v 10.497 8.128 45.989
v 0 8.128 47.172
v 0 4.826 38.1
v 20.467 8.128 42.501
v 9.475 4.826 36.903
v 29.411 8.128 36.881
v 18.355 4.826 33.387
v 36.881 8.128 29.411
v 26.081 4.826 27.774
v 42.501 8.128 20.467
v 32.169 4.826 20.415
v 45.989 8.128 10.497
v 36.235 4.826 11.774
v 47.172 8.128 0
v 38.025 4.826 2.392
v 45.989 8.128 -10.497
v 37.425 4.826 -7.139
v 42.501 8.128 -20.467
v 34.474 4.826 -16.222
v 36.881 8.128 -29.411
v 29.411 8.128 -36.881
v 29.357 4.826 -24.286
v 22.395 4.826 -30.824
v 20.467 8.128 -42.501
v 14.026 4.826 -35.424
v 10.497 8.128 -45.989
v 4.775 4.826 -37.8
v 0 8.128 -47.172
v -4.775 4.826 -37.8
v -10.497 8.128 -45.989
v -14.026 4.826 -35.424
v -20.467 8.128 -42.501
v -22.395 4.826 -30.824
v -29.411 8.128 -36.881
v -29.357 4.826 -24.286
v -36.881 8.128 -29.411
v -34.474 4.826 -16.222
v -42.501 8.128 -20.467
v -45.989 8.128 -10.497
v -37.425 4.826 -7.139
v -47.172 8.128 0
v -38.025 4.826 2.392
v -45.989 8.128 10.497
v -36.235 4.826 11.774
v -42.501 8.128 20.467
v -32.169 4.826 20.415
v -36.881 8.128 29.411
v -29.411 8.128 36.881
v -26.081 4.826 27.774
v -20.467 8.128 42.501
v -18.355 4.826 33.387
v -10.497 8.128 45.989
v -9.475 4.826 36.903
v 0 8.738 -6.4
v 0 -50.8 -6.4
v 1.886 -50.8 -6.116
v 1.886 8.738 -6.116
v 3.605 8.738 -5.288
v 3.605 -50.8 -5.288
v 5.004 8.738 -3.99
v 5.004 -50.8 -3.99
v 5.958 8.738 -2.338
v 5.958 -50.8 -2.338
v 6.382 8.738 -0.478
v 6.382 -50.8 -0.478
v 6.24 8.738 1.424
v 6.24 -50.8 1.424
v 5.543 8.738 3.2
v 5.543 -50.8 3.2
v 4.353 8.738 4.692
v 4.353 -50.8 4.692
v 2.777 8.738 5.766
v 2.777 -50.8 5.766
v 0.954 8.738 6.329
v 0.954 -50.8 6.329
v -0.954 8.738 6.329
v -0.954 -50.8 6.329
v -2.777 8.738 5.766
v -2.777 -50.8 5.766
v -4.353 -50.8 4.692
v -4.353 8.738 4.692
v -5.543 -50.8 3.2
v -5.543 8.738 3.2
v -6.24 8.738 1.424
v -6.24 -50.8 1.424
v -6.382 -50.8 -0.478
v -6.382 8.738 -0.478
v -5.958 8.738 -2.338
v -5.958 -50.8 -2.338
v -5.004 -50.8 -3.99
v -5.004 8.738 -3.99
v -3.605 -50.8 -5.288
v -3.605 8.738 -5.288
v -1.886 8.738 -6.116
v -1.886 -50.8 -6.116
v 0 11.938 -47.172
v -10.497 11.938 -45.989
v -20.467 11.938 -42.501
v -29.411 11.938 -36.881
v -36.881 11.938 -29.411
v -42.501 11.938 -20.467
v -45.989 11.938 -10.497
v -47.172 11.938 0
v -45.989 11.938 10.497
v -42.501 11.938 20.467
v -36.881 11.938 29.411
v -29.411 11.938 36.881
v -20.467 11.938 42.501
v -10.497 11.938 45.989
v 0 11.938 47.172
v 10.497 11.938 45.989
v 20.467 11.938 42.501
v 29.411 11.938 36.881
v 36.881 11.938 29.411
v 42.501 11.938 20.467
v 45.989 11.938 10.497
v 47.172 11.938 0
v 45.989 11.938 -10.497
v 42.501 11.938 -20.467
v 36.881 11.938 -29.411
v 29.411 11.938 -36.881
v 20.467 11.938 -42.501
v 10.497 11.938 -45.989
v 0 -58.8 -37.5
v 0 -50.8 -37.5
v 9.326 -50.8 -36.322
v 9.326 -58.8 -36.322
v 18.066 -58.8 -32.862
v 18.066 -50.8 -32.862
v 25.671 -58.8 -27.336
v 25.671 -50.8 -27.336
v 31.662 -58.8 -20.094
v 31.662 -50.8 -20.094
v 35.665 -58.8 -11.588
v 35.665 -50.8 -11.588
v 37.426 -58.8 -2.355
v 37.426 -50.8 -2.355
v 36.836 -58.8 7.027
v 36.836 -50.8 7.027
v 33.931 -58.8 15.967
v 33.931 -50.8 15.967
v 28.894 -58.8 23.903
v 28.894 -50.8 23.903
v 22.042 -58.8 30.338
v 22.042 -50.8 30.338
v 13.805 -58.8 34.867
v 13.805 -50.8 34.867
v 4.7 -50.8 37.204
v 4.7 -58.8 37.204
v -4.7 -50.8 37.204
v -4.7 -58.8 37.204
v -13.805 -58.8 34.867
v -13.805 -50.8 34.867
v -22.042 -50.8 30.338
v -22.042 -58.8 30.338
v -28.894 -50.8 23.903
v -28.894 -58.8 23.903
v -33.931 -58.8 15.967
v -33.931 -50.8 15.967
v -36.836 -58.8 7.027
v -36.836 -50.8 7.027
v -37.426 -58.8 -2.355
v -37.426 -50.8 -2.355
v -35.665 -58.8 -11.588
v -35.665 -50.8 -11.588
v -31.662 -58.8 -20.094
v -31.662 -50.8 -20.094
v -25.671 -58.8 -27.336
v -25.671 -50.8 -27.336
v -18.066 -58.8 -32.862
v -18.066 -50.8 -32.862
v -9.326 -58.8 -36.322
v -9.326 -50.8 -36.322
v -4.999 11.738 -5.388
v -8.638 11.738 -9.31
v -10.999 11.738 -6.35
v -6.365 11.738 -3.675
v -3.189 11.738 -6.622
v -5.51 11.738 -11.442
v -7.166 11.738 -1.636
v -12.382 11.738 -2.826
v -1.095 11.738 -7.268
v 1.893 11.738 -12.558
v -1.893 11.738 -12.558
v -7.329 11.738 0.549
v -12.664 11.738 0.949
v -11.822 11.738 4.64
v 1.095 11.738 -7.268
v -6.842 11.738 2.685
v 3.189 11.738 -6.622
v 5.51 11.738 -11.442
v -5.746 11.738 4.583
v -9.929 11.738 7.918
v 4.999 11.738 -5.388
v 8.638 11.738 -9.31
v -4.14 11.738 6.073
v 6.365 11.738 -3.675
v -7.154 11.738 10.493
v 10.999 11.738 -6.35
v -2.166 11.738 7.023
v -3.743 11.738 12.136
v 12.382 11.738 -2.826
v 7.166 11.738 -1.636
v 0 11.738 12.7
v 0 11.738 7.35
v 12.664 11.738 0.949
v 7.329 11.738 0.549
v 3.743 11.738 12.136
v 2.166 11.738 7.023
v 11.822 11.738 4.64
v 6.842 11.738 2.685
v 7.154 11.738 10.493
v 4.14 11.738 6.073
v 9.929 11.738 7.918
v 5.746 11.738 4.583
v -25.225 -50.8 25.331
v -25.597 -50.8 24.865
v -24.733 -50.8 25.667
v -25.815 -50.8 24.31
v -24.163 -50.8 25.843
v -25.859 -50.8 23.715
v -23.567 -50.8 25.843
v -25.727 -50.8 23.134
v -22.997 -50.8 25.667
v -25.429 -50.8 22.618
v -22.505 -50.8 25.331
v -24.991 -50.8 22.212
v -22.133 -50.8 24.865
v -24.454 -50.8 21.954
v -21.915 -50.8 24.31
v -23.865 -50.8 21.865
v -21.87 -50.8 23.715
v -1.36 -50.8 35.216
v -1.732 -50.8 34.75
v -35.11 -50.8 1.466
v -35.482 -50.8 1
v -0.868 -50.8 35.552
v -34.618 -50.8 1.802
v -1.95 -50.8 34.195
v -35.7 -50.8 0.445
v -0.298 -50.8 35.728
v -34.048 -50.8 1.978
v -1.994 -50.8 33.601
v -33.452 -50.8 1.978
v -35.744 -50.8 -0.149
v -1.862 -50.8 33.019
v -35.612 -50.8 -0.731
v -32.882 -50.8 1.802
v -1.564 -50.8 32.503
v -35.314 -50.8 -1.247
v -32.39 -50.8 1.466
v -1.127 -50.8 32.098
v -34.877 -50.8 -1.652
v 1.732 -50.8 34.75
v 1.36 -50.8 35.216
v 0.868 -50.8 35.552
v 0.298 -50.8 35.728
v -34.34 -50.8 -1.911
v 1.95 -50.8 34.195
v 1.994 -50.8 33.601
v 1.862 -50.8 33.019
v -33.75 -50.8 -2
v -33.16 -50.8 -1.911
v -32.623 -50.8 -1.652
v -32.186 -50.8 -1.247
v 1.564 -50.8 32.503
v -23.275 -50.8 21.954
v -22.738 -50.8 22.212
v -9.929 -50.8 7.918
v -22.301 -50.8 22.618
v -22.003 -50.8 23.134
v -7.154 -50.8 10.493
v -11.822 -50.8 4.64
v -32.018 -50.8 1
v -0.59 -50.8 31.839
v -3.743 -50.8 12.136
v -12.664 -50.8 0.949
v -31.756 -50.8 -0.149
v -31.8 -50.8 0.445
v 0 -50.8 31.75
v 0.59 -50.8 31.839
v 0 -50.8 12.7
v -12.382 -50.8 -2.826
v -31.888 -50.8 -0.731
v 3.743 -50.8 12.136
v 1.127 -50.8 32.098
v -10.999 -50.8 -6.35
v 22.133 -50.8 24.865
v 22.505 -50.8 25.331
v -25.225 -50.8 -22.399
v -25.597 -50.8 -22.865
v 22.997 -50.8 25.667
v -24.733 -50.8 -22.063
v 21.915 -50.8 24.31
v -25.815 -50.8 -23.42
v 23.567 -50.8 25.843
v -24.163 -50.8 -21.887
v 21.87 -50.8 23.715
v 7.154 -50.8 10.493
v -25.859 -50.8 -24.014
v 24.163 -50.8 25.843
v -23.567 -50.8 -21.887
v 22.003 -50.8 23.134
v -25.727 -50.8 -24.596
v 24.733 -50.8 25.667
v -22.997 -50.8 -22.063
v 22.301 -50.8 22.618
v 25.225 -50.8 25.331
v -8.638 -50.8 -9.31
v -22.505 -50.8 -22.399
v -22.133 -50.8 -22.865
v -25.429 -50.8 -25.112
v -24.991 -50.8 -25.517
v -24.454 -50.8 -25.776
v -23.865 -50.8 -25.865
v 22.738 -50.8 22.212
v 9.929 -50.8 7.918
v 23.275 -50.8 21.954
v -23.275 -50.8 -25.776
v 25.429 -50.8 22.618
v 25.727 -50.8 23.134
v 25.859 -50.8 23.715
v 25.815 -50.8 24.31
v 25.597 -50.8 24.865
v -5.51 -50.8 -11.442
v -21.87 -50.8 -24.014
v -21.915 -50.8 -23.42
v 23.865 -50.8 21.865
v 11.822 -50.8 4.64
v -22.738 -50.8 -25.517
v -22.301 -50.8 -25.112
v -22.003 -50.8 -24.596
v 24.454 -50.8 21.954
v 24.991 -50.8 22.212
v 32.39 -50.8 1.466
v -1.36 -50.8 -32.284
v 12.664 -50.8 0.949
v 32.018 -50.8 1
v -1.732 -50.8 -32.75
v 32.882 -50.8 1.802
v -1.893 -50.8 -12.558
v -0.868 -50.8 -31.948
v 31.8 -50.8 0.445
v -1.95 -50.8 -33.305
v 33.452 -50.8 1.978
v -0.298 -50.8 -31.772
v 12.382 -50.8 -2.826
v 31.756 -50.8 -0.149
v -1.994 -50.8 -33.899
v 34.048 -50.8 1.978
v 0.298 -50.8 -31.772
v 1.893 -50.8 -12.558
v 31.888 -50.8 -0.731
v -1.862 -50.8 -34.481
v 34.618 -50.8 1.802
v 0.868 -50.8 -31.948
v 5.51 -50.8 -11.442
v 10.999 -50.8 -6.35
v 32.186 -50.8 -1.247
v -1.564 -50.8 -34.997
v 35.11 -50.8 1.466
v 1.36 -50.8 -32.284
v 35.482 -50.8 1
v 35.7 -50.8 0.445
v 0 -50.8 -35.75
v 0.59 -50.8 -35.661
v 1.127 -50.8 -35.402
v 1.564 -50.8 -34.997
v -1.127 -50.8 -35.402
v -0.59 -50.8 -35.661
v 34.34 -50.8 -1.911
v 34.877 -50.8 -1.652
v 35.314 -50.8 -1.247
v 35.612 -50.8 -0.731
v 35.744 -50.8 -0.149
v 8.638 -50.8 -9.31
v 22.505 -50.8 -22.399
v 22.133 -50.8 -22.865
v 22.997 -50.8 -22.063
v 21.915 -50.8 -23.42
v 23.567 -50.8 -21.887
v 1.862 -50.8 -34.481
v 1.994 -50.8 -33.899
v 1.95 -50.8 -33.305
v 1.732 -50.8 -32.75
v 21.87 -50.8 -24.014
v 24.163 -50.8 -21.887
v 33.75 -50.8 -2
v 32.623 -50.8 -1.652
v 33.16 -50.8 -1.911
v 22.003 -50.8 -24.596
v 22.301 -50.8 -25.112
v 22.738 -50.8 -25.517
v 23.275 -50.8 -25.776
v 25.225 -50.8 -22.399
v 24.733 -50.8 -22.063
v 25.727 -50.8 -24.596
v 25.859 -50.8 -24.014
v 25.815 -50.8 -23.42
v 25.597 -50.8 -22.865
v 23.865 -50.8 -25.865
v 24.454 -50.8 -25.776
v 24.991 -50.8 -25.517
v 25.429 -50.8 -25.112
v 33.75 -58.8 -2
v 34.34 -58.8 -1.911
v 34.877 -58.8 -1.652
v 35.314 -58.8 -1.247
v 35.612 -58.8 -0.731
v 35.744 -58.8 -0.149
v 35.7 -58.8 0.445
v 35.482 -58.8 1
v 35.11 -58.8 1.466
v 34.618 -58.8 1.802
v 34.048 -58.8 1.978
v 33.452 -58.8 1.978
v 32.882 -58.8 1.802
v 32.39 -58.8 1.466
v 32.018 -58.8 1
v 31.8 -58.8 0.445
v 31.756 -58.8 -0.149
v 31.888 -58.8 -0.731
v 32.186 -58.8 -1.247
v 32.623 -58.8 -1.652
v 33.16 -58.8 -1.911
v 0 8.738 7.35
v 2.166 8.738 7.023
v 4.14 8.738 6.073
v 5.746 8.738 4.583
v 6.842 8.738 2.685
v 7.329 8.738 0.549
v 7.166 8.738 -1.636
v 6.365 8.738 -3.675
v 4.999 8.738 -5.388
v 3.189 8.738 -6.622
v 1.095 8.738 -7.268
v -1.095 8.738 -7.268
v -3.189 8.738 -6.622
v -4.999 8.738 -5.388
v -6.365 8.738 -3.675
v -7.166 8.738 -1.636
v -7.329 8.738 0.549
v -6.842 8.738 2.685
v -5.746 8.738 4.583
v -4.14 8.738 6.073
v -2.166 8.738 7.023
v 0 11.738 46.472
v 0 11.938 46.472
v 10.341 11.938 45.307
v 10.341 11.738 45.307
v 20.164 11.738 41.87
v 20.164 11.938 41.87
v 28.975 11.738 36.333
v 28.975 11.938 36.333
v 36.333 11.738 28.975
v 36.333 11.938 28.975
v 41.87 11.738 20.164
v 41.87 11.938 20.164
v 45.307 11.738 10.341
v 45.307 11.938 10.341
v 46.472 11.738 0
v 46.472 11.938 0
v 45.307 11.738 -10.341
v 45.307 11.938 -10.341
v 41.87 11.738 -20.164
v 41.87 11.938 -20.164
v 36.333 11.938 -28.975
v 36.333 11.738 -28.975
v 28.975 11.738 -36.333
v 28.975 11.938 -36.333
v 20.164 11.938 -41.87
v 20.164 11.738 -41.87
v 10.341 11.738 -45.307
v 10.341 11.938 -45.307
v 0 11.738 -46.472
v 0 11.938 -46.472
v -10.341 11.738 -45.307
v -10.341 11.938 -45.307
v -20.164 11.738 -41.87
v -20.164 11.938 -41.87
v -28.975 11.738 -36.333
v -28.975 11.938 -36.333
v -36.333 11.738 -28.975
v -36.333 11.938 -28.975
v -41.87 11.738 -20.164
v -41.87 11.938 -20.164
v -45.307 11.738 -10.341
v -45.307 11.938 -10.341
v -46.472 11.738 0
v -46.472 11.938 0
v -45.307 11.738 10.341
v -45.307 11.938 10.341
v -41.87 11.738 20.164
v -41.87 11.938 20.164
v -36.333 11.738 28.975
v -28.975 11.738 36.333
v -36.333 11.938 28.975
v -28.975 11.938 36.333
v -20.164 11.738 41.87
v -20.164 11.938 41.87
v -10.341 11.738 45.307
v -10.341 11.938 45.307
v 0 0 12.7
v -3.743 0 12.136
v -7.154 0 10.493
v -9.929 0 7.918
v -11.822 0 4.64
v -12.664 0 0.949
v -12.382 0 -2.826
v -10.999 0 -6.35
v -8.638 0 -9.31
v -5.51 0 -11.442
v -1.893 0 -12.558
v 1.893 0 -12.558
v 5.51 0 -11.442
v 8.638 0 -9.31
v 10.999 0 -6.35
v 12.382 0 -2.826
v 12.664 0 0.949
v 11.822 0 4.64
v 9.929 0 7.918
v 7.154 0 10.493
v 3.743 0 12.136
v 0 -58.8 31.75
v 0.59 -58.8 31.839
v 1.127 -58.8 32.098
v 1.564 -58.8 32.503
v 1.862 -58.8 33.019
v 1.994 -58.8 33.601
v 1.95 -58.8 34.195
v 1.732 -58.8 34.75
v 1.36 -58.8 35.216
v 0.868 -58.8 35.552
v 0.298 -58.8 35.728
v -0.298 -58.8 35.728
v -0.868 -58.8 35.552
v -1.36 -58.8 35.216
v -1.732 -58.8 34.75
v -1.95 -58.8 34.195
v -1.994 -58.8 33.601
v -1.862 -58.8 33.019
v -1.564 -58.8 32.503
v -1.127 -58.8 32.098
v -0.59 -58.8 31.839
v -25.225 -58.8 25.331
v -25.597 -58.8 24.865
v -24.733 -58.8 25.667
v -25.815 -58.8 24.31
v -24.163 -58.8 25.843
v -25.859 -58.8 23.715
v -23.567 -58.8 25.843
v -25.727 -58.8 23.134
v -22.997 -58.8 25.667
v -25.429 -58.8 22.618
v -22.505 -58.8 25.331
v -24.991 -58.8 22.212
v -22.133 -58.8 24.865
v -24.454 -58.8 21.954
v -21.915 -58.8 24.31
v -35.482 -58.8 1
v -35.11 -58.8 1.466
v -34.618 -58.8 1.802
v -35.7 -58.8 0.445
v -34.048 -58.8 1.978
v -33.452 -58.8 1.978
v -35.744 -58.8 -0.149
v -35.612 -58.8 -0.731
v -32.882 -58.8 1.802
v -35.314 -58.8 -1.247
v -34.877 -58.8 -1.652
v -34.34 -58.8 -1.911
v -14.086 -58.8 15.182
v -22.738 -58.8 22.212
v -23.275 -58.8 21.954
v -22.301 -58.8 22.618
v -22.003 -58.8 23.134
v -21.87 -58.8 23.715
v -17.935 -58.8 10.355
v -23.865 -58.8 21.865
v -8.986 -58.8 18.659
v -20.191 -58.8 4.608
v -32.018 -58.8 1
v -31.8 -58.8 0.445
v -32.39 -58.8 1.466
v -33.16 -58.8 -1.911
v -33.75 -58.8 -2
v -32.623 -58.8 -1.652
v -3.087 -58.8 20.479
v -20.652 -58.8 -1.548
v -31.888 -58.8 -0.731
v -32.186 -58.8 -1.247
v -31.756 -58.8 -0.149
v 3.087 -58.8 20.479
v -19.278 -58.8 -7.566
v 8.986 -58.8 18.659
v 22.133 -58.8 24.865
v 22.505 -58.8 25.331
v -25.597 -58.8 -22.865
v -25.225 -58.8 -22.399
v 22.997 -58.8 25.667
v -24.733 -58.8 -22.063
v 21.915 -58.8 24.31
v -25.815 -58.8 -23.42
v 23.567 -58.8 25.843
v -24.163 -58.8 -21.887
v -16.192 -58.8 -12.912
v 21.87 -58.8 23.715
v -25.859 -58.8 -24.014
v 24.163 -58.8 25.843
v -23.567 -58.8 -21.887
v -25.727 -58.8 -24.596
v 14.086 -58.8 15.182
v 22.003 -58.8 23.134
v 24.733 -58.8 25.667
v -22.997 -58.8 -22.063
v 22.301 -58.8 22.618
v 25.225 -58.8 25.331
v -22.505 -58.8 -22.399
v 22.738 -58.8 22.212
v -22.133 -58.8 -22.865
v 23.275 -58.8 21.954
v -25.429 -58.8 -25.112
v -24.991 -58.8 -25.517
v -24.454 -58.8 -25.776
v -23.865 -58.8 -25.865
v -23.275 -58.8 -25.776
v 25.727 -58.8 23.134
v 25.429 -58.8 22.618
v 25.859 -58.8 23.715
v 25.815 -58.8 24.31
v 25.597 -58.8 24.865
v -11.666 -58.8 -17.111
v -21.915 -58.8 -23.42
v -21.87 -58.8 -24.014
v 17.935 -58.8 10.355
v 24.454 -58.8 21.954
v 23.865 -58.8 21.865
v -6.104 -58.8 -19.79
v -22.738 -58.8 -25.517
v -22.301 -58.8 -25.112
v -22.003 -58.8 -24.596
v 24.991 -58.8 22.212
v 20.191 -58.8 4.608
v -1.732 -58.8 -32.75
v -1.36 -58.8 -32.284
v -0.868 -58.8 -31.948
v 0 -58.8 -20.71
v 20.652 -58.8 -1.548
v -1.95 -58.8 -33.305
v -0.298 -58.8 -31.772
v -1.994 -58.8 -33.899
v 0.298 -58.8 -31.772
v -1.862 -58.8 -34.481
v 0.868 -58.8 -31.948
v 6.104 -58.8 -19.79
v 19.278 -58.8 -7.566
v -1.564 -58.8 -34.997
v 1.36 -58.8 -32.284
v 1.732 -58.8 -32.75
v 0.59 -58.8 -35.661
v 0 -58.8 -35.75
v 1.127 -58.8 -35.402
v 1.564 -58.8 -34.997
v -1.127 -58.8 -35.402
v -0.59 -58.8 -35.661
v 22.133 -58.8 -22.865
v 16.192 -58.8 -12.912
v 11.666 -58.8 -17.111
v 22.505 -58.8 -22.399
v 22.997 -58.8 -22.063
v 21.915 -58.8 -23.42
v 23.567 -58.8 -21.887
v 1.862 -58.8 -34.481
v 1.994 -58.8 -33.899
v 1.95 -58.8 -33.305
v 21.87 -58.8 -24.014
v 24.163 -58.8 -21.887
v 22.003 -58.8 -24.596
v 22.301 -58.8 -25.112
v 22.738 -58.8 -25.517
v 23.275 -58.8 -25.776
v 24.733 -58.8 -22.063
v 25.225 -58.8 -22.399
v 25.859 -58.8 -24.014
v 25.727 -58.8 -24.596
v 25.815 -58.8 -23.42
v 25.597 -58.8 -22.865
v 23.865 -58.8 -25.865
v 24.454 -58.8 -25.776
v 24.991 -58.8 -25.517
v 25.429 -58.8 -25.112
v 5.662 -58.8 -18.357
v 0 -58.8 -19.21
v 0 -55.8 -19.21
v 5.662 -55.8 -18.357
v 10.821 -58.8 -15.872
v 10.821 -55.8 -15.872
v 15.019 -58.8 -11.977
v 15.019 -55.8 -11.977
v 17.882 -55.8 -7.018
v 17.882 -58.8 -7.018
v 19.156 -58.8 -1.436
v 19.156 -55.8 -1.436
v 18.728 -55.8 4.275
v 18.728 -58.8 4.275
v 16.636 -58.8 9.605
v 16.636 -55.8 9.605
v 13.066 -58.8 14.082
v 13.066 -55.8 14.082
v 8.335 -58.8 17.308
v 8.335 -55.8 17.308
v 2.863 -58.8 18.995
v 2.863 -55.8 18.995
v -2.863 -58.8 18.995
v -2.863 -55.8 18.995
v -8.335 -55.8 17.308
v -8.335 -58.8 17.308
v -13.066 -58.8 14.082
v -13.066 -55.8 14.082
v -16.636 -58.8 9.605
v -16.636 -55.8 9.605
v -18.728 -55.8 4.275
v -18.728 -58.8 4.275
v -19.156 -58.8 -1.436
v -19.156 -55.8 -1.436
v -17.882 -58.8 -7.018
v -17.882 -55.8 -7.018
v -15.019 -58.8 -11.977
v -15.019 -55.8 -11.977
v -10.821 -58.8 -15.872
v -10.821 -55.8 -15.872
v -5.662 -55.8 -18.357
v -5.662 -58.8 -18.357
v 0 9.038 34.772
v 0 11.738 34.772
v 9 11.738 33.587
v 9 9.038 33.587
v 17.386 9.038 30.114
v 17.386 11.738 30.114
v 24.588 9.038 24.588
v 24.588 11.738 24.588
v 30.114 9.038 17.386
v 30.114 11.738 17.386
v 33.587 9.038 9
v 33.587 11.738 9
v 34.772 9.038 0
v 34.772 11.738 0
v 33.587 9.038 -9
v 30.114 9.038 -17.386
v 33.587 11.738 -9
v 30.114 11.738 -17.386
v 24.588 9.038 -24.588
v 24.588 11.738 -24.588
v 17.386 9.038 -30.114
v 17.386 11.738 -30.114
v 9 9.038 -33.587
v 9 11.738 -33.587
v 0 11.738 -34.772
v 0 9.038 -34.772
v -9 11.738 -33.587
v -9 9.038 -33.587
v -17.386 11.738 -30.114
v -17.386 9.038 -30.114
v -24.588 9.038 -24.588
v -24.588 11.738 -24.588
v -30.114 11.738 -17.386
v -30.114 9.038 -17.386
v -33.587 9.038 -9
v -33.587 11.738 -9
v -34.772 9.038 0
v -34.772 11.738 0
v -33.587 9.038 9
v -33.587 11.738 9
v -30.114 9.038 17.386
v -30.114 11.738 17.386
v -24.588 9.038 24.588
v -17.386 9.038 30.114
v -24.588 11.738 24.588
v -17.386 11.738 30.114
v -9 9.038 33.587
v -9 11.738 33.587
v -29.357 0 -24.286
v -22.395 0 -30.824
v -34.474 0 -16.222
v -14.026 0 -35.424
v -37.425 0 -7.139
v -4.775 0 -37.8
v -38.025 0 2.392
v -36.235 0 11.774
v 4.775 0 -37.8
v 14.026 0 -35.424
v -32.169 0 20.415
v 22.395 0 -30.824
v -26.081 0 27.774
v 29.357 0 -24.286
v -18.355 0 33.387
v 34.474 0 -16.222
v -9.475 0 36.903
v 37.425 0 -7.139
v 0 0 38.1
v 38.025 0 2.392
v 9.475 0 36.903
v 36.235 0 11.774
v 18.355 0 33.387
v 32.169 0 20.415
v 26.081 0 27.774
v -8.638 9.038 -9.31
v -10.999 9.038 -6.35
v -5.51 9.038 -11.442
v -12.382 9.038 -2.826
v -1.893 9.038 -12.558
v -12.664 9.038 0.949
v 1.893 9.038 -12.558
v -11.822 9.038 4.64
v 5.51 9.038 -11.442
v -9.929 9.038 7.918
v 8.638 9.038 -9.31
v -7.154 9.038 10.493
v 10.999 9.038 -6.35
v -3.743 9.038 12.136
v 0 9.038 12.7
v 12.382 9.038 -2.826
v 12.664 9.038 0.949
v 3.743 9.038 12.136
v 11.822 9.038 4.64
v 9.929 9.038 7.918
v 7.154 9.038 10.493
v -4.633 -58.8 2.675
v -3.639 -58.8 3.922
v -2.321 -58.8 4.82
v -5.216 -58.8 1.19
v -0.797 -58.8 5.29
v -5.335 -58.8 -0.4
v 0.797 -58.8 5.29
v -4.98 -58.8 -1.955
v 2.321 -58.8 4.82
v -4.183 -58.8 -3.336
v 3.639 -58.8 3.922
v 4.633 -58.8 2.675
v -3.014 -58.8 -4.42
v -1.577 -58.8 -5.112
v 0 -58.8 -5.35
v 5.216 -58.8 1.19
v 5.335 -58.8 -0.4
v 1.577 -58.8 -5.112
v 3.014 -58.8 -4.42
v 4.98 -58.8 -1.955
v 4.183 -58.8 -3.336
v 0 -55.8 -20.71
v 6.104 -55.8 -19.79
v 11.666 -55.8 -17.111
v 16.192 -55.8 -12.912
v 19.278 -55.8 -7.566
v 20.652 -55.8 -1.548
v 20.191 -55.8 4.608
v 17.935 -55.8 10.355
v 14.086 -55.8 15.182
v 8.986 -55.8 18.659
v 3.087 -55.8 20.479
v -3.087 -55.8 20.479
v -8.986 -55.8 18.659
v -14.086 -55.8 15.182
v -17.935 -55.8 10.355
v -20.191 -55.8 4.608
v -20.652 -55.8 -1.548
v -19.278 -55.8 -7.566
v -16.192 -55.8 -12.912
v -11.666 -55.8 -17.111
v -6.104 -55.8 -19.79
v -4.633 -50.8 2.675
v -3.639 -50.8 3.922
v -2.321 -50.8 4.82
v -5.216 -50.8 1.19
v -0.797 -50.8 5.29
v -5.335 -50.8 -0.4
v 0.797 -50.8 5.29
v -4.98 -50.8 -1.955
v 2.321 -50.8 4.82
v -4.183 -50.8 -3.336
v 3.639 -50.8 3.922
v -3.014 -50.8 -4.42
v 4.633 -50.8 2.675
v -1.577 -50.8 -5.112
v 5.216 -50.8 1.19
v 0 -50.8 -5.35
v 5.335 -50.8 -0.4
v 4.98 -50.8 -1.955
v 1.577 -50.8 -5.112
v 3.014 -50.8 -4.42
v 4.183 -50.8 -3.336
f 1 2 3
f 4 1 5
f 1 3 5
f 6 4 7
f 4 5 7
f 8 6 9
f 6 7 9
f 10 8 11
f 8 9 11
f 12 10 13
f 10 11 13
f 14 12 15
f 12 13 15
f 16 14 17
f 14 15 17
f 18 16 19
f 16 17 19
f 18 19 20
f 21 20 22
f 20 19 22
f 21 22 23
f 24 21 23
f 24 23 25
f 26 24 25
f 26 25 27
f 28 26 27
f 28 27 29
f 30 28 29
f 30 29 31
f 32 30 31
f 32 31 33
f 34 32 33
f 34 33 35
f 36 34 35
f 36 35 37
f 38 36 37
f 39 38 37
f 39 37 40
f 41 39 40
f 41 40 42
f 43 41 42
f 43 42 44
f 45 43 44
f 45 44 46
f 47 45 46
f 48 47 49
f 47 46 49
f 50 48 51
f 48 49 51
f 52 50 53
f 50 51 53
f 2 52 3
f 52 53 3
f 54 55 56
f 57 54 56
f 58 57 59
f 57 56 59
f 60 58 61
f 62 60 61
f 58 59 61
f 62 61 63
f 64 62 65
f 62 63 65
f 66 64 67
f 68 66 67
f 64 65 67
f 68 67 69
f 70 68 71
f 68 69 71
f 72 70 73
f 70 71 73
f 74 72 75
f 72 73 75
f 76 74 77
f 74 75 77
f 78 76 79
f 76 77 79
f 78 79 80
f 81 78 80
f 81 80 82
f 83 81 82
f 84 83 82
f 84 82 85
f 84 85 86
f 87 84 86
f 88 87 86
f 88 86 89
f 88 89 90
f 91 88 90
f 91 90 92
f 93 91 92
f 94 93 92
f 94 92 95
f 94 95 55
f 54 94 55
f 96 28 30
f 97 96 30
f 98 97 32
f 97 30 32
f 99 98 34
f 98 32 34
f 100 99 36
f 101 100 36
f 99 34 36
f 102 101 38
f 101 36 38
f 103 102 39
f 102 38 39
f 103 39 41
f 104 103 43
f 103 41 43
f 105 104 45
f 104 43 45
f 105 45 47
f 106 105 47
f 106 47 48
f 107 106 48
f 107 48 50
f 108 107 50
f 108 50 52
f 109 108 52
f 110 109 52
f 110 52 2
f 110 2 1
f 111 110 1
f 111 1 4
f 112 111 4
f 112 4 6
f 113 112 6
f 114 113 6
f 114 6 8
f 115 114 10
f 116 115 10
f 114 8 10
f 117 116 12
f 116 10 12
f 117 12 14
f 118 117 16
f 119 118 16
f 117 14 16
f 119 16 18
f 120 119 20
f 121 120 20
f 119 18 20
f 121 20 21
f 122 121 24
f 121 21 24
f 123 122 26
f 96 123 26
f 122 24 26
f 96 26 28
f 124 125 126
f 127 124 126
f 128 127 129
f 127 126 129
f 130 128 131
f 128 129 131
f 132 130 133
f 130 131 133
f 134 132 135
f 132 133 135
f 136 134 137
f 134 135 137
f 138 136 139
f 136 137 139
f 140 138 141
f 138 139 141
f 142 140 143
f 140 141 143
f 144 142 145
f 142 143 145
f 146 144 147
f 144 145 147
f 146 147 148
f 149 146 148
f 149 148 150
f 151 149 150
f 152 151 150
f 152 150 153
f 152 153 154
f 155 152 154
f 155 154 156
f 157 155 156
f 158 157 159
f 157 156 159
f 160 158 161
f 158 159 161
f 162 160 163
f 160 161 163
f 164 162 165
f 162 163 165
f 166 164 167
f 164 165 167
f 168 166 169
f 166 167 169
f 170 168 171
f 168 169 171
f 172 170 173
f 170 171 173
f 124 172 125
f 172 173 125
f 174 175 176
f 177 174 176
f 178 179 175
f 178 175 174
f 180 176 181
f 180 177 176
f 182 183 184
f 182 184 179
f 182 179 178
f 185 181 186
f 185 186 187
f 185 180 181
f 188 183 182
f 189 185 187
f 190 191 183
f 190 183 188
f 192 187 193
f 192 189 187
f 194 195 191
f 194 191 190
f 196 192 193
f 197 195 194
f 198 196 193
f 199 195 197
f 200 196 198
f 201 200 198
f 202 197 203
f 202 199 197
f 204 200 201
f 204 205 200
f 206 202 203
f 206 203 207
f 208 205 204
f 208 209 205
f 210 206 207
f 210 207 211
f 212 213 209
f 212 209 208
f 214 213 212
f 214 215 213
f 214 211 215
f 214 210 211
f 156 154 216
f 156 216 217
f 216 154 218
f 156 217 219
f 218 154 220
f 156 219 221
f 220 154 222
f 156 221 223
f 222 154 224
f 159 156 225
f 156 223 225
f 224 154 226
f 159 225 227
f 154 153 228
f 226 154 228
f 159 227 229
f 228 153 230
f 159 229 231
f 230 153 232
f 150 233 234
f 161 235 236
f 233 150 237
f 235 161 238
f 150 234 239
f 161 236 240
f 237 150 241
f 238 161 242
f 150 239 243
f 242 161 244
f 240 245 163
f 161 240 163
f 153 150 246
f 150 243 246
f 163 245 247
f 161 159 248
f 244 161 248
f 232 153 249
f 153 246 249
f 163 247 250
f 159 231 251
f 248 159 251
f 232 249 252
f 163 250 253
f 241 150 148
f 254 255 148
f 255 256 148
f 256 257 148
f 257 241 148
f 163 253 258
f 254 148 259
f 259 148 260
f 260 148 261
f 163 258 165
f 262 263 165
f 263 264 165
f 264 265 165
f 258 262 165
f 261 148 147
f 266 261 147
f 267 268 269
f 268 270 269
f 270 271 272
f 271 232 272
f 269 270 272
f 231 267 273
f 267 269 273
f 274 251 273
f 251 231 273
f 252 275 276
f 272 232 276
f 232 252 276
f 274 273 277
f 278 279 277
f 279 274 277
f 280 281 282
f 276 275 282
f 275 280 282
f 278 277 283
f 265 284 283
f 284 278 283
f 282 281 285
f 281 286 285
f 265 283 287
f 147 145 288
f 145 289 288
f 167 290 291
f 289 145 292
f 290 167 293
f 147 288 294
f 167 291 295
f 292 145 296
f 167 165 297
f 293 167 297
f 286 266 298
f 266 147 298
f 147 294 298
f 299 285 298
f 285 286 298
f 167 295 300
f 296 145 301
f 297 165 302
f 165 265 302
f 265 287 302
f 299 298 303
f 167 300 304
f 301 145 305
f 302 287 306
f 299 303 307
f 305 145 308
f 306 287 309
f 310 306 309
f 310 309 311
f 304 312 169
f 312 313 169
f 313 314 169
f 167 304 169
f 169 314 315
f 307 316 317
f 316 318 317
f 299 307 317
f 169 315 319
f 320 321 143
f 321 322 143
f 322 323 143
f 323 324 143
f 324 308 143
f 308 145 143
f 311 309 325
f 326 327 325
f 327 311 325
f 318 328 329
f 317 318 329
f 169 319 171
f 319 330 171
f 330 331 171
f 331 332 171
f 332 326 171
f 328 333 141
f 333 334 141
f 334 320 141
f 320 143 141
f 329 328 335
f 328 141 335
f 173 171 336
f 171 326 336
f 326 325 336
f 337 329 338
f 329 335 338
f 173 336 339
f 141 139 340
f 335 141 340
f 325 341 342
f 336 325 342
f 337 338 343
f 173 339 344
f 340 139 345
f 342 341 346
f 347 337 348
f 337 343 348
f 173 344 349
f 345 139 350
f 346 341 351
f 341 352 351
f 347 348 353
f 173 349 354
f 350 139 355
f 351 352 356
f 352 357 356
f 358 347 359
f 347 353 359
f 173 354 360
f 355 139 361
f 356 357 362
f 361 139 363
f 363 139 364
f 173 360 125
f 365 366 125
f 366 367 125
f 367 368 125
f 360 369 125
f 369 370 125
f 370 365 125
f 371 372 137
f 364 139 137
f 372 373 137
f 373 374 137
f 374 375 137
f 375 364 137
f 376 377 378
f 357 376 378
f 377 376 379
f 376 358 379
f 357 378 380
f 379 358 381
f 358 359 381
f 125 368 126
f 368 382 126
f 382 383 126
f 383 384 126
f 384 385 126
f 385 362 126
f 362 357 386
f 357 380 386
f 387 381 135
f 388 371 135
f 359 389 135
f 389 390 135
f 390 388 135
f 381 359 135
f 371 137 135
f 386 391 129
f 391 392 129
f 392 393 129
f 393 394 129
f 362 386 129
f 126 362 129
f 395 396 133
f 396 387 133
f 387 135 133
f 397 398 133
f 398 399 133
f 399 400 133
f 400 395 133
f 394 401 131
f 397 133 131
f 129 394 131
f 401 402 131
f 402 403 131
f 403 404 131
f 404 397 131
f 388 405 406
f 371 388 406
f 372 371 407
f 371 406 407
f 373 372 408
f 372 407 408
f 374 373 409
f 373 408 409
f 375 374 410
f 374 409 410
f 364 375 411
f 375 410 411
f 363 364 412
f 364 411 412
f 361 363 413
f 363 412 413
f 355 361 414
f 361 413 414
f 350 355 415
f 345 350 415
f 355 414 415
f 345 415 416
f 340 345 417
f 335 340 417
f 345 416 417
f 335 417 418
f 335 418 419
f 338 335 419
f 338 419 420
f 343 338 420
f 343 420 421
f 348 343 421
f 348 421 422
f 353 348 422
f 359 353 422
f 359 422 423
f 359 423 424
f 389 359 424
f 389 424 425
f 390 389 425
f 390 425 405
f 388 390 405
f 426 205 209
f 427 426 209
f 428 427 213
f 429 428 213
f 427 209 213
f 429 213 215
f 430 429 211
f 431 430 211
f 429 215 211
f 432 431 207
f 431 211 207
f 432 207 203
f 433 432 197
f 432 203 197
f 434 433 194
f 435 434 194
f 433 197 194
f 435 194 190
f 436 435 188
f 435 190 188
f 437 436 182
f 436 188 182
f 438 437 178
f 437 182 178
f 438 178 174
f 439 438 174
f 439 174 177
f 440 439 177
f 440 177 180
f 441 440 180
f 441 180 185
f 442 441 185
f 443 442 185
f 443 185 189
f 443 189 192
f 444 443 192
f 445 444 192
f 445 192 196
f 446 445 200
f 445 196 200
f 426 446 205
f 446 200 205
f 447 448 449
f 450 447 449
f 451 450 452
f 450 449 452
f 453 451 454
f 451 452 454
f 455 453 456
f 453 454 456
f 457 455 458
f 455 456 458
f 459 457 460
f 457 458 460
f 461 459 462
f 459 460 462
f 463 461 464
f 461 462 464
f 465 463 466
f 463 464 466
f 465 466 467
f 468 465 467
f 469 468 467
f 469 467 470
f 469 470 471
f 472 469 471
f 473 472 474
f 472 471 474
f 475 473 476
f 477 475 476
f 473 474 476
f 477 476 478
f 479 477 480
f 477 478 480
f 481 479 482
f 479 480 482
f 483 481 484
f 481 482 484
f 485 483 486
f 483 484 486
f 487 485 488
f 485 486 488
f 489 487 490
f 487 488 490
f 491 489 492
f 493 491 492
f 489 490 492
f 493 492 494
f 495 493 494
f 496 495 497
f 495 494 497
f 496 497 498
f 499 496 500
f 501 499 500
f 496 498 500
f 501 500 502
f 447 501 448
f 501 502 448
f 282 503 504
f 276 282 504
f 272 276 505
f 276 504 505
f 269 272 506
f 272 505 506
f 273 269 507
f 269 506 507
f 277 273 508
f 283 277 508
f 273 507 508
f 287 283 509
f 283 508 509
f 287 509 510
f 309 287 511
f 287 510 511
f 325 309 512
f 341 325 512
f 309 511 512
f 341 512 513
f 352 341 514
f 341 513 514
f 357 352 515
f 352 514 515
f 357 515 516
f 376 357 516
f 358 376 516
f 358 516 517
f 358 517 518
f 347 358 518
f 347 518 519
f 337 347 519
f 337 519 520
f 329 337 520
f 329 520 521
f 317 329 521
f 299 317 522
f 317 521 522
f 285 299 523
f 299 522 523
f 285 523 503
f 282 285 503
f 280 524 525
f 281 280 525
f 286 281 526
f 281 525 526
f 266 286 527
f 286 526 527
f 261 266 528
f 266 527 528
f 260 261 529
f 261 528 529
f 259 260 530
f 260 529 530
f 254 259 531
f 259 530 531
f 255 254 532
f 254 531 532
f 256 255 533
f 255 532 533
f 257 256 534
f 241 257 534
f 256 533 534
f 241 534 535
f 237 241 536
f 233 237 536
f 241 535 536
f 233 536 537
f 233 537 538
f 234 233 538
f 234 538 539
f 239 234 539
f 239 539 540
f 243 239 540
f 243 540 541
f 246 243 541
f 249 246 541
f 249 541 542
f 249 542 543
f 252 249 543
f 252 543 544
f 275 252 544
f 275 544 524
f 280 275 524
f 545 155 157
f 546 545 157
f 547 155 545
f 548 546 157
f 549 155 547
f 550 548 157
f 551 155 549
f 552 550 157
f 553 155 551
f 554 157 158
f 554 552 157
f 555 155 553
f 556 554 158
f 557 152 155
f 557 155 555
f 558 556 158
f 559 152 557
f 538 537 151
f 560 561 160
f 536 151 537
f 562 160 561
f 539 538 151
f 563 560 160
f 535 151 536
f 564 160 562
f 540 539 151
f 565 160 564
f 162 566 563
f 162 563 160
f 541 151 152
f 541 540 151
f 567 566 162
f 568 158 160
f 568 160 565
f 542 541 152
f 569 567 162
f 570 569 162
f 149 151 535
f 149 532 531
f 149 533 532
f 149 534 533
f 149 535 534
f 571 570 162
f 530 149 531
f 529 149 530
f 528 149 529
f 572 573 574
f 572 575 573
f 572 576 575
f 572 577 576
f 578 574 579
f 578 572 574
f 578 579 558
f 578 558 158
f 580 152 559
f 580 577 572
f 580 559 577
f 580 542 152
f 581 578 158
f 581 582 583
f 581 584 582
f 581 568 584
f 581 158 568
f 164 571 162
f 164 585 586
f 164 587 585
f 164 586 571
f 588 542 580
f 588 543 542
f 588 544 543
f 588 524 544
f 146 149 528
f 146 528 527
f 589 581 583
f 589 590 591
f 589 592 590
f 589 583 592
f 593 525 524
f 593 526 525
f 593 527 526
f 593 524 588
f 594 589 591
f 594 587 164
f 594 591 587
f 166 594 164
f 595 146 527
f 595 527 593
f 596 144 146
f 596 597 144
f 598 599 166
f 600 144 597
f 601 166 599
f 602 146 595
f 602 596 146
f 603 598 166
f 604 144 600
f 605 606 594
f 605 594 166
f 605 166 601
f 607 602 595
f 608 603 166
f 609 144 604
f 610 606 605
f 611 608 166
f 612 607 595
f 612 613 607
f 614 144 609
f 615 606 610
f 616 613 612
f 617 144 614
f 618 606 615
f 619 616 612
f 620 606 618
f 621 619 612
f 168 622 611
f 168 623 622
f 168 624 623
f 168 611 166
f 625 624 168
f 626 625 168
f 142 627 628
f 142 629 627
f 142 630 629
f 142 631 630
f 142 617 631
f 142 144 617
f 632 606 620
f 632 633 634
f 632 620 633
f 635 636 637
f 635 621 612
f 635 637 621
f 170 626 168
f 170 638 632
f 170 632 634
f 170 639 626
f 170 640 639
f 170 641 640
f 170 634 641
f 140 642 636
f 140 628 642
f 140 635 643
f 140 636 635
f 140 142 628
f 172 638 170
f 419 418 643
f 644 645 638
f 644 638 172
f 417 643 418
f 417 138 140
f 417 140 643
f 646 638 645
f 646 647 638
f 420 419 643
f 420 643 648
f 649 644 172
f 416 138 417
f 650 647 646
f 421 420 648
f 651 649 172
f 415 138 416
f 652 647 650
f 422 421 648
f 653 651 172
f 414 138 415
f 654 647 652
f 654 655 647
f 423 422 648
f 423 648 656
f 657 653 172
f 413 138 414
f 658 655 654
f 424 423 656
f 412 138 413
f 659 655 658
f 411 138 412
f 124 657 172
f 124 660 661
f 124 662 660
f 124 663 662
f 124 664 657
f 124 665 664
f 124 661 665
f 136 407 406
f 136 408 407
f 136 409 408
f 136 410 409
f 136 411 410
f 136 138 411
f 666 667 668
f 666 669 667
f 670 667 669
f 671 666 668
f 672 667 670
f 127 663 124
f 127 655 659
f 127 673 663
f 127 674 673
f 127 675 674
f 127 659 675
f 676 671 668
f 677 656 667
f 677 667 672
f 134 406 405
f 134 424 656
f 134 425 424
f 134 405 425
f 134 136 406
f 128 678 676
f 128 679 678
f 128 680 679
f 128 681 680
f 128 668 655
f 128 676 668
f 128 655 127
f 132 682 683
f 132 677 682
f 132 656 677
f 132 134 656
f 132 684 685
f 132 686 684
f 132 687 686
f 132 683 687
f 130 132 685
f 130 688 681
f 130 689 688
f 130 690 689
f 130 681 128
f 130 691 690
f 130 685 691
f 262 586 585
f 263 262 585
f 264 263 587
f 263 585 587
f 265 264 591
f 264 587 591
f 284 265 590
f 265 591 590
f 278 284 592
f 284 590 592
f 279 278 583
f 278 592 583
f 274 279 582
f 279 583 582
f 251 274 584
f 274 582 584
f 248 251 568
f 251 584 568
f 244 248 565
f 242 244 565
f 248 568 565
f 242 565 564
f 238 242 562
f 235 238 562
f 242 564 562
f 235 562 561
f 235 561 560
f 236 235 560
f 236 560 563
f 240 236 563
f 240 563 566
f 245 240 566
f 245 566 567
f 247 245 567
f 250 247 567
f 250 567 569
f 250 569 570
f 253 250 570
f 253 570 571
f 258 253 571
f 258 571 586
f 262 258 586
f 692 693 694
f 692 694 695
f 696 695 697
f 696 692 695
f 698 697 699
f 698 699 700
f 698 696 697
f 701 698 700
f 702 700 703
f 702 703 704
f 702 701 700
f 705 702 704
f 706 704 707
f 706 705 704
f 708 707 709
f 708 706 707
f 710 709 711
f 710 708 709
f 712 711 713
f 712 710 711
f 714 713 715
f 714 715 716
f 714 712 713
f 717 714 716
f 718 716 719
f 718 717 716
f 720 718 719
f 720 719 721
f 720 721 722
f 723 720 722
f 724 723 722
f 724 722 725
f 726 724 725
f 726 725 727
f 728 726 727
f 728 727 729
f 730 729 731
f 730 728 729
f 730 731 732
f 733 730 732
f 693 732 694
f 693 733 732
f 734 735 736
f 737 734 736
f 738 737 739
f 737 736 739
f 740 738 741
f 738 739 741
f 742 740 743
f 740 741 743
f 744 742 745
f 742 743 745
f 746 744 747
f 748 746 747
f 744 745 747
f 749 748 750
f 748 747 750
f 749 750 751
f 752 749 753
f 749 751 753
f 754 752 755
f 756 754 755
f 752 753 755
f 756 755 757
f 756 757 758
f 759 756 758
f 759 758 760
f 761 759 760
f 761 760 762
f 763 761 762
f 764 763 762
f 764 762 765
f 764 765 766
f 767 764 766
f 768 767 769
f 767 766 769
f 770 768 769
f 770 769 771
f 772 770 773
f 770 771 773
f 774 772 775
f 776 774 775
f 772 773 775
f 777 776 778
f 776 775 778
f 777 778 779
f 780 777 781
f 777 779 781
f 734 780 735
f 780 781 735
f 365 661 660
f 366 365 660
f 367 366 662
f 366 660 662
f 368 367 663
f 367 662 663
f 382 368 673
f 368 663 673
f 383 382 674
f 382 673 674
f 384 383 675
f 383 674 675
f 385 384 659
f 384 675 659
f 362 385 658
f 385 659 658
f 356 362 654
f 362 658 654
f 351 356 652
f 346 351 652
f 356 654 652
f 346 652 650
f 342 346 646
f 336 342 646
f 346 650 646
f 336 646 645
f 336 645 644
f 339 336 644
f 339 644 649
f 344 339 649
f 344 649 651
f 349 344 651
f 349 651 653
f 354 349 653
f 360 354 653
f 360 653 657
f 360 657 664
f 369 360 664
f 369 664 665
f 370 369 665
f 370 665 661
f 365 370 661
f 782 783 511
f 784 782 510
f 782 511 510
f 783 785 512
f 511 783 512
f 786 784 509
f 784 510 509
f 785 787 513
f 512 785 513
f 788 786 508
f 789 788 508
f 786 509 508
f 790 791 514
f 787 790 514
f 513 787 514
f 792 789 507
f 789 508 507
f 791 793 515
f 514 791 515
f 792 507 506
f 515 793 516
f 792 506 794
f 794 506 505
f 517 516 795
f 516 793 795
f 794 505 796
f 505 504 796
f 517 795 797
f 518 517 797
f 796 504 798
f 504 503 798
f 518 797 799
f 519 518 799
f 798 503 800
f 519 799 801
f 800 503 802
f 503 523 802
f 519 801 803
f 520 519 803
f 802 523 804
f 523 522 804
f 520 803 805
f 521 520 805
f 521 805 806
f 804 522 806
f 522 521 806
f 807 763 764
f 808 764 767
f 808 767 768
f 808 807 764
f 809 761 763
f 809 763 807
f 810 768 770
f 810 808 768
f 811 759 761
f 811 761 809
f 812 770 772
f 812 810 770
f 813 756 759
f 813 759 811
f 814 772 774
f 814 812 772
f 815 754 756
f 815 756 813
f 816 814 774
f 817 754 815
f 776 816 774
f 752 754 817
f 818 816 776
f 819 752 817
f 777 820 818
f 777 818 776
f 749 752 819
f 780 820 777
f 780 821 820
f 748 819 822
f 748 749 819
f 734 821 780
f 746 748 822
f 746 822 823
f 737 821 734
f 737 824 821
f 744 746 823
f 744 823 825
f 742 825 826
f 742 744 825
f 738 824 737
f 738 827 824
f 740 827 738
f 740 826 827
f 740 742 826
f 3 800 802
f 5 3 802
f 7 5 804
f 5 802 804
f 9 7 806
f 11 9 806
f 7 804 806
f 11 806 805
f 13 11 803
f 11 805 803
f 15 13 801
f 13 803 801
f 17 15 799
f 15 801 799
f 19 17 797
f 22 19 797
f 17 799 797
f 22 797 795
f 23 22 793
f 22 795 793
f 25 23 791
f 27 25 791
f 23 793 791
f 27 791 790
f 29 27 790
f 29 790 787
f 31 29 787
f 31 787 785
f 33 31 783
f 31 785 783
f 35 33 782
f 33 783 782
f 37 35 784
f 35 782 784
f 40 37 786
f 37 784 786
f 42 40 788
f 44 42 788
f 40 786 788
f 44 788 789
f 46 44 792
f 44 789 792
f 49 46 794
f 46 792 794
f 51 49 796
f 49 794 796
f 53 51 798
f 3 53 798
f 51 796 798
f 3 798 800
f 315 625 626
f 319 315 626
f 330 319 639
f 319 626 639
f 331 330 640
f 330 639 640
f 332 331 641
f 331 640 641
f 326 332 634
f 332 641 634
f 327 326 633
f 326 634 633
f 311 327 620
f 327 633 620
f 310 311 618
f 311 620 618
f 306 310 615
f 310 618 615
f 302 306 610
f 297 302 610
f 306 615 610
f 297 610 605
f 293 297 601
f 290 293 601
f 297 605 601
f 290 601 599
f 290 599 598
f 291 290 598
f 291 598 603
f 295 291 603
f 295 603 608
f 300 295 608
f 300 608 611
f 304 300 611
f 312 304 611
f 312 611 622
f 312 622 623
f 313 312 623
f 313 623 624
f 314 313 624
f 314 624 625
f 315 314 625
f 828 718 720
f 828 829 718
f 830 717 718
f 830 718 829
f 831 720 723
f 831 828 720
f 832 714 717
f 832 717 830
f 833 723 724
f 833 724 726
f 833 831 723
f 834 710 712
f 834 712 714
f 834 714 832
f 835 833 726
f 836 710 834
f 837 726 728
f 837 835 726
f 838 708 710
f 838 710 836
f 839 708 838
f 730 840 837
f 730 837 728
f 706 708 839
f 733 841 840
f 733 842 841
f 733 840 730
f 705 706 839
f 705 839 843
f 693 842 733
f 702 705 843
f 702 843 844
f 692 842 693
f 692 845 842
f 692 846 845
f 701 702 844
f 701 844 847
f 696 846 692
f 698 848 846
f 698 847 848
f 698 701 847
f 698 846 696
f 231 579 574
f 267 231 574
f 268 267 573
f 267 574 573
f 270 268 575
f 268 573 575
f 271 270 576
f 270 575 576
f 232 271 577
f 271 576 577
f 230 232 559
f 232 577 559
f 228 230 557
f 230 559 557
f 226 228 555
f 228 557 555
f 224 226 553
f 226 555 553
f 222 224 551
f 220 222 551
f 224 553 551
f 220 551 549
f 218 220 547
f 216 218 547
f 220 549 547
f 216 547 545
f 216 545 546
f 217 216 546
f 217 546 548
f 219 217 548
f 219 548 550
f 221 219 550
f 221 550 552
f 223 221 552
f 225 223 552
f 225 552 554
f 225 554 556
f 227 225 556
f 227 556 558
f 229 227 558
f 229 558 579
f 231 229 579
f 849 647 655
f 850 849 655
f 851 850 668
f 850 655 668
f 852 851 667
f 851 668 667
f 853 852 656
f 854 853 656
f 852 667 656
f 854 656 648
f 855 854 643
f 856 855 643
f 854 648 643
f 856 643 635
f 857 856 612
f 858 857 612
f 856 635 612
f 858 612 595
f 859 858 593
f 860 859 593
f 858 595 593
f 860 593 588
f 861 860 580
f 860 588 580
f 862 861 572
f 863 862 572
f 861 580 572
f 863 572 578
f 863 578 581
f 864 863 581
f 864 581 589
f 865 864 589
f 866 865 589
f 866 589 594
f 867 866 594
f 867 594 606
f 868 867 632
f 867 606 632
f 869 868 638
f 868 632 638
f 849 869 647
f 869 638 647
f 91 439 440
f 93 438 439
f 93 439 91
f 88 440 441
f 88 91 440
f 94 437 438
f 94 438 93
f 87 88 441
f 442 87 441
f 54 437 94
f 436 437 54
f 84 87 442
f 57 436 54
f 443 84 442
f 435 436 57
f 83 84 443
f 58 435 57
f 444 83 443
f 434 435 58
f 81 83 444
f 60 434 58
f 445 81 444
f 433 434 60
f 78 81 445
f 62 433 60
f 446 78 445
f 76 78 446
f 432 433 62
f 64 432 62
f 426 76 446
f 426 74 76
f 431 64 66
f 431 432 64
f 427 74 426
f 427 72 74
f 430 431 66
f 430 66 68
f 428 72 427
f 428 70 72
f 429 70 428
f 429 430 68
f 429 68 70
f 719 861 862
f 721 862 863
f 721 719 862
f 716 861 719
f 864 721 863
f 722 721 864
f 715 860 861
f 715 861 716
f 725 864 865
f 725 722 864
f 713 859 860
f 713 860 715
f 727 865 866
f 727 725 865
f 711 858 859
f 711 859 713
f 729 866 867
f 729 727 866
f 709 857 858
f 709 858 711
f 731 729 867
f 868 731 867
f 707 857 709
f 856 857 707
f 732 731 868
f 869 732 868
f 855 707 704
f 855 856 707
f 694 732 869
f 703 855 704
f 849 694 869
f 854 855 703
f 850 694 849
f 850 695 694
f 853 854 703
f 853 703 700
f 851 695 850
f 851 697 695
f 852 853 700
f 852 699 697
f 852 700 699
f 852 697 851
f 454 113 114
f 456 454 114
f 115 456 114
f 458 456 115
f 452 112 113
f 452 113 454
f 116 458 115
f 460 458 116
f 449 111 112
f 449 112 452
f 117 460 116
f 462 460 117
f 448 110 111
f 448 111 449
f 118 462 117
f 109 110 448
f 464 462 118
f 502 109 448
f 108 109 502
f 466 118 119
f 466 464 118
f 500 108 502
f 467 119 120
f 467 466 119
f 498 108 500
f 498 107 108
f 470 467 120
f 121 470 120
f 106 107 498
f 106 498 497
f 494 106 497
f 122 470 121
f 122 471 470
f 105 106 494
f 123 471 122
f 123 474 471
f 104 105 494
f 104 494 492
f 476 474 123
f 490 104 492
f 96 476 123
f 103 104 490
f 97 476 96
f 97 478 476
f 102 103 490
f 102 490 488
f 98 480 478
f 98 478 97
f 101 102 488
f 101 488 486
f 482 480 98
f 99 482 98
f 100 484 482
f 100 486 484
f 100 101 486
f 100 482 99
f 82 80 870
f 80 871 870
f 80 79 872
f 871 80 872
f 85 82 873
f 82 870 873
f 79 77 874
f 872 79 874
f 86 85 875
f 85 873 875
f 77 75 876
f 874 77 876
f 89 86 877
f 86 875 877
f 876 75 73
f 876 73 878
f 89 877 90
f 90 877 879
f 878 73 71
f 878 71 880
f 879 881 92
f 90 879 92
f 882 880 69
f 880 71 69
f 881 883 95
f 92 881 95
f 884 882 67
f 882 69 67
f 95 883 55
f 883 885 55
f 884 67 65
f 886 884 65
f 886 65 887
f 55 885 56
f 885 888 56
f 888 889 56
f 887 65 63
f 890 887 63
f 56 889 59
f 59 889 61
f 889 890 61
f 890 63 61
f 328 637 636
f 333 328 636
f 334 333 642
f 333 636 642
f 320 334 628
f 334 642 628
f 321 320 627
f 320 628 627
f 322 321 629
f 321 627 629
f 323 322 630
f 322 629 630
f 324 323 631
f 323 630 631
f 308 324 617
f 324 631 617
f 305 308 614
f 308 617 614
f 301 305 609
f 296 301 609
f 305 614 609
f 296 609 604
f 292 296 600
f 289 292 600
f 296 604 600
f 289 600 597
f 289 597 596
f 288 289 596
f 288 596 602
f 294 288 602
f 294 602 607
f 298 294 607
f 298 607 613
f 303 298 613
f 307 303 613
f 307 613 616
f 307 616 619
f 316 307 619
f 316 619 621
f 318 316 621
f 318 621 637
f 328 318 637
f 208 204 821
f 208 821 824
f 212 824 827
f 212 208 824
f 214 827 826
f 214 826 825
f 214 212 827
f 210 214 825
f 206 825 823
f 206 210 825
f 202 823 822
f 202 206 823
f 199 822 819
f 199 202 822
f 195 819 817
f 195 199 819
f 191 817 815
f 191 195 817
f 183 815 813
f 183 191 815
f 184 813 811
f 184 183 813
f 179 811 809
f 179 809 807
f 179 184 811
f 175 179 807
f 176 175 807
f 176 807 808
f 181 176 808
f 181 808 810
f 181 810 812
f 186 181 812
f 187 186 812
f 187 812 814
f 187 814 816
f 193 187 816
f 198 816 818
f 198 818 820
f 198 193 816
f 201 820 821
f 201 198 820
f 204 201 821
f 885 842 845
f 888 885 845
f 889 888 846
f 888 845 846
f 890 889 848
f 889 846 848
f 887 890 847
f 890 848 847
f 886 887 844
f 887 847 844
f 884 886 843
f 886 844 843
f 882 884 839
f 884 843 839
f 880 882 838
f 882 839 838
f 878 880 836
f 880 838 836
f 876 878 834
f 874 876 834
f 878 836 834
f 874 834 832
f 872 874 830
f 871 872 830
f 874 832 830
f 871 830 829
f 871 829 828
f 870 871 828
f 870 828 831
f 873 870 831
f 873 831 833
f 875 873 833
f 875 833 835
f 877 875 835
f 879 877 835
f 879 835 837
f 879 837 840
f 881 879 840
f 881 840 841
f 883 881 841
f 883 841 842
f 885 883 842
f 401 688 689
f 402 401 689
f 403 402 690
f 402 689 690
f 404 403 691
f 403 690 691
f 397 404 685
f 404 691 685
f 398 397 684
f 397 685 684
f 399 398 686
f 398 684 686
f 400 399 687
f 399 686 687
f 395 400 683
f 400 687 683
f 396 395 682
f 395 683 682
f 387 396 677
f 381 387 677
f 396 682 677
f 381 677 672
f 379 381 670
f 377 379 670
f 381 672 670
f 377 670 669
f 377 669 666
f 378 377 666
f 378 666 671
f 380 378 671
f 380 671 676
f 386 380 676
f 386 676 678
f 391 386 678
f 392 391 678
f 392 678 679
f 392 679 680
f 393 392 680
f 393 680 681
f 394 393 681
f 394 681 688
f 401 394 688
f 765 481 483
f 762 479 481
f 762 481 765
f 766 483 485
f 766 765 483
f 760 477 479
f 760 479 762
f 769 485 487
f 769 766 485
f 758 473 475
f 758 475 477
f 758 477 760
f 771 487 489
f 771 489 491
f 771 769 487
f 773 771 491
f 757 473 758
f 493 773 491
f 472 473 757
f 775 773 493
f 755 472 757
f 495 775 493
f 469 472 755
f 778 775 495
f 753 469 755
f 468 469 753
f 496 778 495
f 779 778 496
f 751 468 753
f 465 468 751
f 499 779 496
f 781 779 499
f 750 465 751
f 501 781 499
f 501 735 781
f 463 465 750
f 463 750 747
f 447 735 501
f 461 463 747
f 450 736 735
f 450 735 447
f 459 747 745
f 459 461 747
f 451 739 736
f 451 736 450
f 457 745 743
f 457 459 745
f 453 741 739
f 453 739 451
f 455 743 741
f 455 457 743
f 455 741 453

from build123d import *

# Parameters (mm, degrees)
SKETCH1_R           = 38.1
BOSS_EXTRUDE1_DEPTH = 4.826
SKETCH2_R           = 38.1
BOSS_EXTRUDE2_DEPTH = 3.302
BOSS_EXTRUDE2_DRAFT = -70
SKETCH3_R           = 47.172170439
BOSS_EXTRUDE3_DEPTH = 3.81
SKETCH4_R           = 46.472170439
CUT_EXTRUDE1_DEPTH  = 0.2
SKETCH6_R           = 34.772170439
SKETCH6_R_2         = 12.7
CUT_EXTRUDE2_DEPTH  = 2.7
SKETCH8_R           = 12.7
BOSS_EXTRUDE4_DEPTH = 50.8
SKETCH10_R          = 7.35
CUT_EXTRUDE5_DEPTH  = 3
SKETCH13_R          = 6.4
CUT_EXTRUDE9_DEPTH  = 92.577748235
SKETCH15_R          = 37.5
BOSS_EXTRUDE6_DEPTH = 8
CUT_EXTRUDE10_REACH = 99.233
SKETCH16_R          = 2
SKETCH16_R_2        = 5.35
SKETCH17_R          = 20.71
SKETCH17_R_2        = 19.21
CUT_EXTRUDE11_DEPTH = 3


with BuildPart() as part:
    # Sketch1 → Boss-Extrude1 (new body)
    with BuildSketch(Plane(origin=(0, 0, 0), x_dir=(1, 0, 0), z_dir=(0, 1, 0))):
        with Locations(Location((0, 0, 0), (0, 0, 270))):
            Circle(SKETCH1_R)
    extrude(amount=BOSS_EXTRUDE1_DEPTH)


with BuildPart() as boss_extrude2_tool:
    # Sketch2 → Boss-Extrude2 (with draft: the straight prism first)
    with BuildSketch(Plane(origin=(0, 4.826, 0), x_dir=(1, 0, 0), z_dir=(0, 1, 0))):
        with Locations(Location((0, 0, 0), (0, 0, 270))):
            Circle(SKETCH2_R)
    extrude(amount=BOSS_EXTRUDE2_DEPTH)
    # Boss-Extrude2: the draft: its side faces are tilted about the plane it starts from
    boss_extrude2_sides = [boss_extrude2_tool.faces().sort_by_distance(p)[0] for p in [
        (0, 6.477, -38.1),
    ]]
    draft(boss_extrude2_sides, Plane(origin=(0, 4.826, 0), x_dir=(1, 0, 0), z_dir=(0, 1, 0)), BOSS_EXTRUDE2_DRAFT)


with BuildPart() as part_1:
    add(part.part)

    # Boss-Extrude2: add boss_extrude2_tool
    add(boss_extrude2_tool.part)

    # Sketch3 → Boss-Extrude3 (add)
    with BuildSketch(Plane(origin=(0, 8.128, 0), x_dir=(1, 0, 0), z_dir=(0, 1, 0))):
        with Locations(Location((0, 0, 0), (0, 0, 90))):
            Circle(SKETCH3_R)
    extrude(amount=BOSS_EXTRUDE3_DEPTH)

    # Sketch4 → Cut-Extrude1 (cut)
    with BuildSketch(Plane(origin=(0, 11.938, 0), x_dir=(1, 0, 0), z_dir=(0, 1, 0))):
        with Locations(Location((0, 0, 0), (0, 0, 270))):
            Circle(SKETCH4_R)
    extrude(amount=-CUT_EXTRUDE1_DEPTH, mode=Mode.SUBTRACT)

    # Sketch6 → Cut-Extrude2 (cut)
    with BuildSketch(Plane(origin=(0, 11.738, 0), x_dir=(1, 0, 0), z_dir=(0, 1, 0))):
        with Locations(Location((0, 0, 0), (0, 0, 270))):
            Circle(SKETCH6_R)
        with Locations(Location((0, 0, 0), (0, 0, 270))):
            Circle(SKETCH6_R_2, mode=Mode.SUBTRACT)
    extrude(amount=-CUT_EXTRUDE2_DEPTH, mode=Mode.SUBTRACT)

    # Sketch8 → Boss-Extrude4 (add)
    with BuildSketch(Plane.XZ):
        with Locations(Location((0, 0, 0), (0, 0, 90))):
            Circle(SKETCH8_R)
    extrude(amount=BOSS_EXTRUDE4_DEPTH)

    # Sketch10 → Cut-Extrude5 (cut)
    with BuildSketch(Plane(origin=(0, 11.738, 0), x_dir=(1, 0, 0), z_dir=(0, 1, 0))):
        with Locations(Location((0, 0, 0), (0, 0, 270))):
            Circle(SKETCH10_R)
    extrude(amount=-CUT_EXTRUDE5_DEPTH, mode=Mode.SUBTRACT)

    # Sketch13 → Cut-Extrude9 (cut, through all)
    with BuildSketch(Plane(origin=(0, -50.8, 0), x_dir=(-1, 0, 0), z_dir=(0, -1, 0))):
        with Locations(Location((0, 0, 0), (0, 0, 90))):
            Circle(SKETCH13_R)
    extrude(amount=-CUT_EXTRUDE9_DEPTH, mode=Mode.SUBTRACT)

    # Sketch15 → Boss-Extrude6 (add)
    with BuildSketch(Plane.XZ.offset(50.8)):
        with Locations(Location((0, 0, 0), (0, 0, 270))):
            Circle(SKETCH15_R)
    extrude(amount=BOSS_EXTRUDE6_DEPTH)

    # Sketch16 → Cut-Extrude10 (cut, up to next)
    with BuildSketch(Plane.XZ.offset(58.8), mode=Mode.PRIVATE) as cut_extrude10_sk1:
        with Locations(Location((0, 33.75, 0), (0, 0, 270))):
            Circle(SKETCH16_R)
    cut_extrude10_tool1 = extrude(cut_extrude10_sk1.sketch, amount=-CUT_EXTRUDE10_REACH, mode=Mode.PRIVATE) & part_1.part
    # Sketch16 → Cut-Extrude10 (cut, up to next)
    with BuildSketch(Plane.XZ.offset(58.8), mode=Mode.PRIVATE) as cut_extrude10_sk2:
        with Locations(Location((23.864853865, 23.864853865, 0), (0, 0, 270))):
            Circle(SKETCH16_R)
    cut_extrude10_tool2 = extrude(cut_extrude10_sk2.sketch, amount=-CUT_EXTRUDE10_REACH, mode=Mode.PRIVATE) & part_1.part
    # Sketch16 → Cut-Extrude10 (cut, up to next)
    with BuildSketch(Plane.XZ.offset(58.8), mode=Mode.PRIVATE) as cut_extrude10_sk3:
        with Locations(Location((33.75, 0, 0), (0, 0, 270))):
            Circle(SKETCH16_R)
    cut_extrude10_tool3 = extrude(cut_extrude10_sk3.sketch, amount=-CUT_EXTRUDE10_REACH, mode=Mode.PRIVATE) & part_1.part
    # Sketch16 → Cut-Extrude10 (cut, up to next)
    with BuildSketch(Plane.XZ.offset(58.8), mode=Mode.PRIVATE) as cut_extrude10_sk4:
        with Locations(Location((23.864853865, -23.864853865, 0), (0, 0, 270))):
            Circle(SKETCH16_R)
    cut_extrude10_tool4 = extrude(cut_extrude10_sk4.sketch, amount=-CUT_EXTRUDE10_REACH, mode=Mode.PRIVATE) & part_1.part
    # Sketch16 → Cut-Extrude10 (cut, up to next)
    with BuildSketch(Plane.XZ.offset(58.8), mode=Mode.PRIVATE) as cut_extrude10_sk5:
        with Locations(Location((0, -33.75, 0), (0, 0, 270))):
            Circle(SKETCH16_R)
    cut_extrude10_tool5 = extrude(cut_extrude10_sk5.sketch, amount=-CUT_EXTRUDE10_REACH, mode=Mode.PRIVATE) & part_1.part
    # Sketch16 → Cut-Extrude10 (cut, up to next)
    with BuildSketch(Plane.XZ.offset(58.8), mode=Mode.PRIVATE) as cut_extrude10_sk6:
        with Locations(Location((-23.864853865, -23.864853865, 0), (0, 0, 270))):
            Circle(SKETCH16_R)
    cut_extrude10_tool6 = extrude(cut_extrude10_sk6.sketch, amount=-CUT_EXTRUDE10_REACH, mode=Mode.PRIVATE) & part_1.part
    # Sketch16 → Cut-Extrude10 (cut, up to next)
    with BuildSketch(Plane.XZ.offset(58.8), mode=Mode.PRIVATE) as cut_extrude10_sk7:
        with Locations(Location((-33.75, 0, 0), (0, 0, 270))):
            Circle(SKETCH16_R)
    cut_extrude10_tool7 = extrude(cut_extrude10_sk7.sketch, amount=-CUT_EXTRUDE10_REACH, mode=Mode.PRIVATE) & part_1.part
    # Sketch16 → Cut-Extrude10 (cut, up to next)
    with BuildSketch(Plane.XZ.offset(58.8), mode=Mode.PRIVATE) as cut_extrude10_sk8:
        with Locations(Location((-23.864853865, 23.864853865, 0), (0, 0, 270))):
            Circle(SKETCH16_R)
    cut_extrude10_tool8 = extrude(cut_extrude10_sk8.sketch, amount=-CUT_EXTRUDE10_REACH, mode=Mode.PRIVATE) & part_1.part
    # Sketch16 → Cut-Extrude10 (cut, up to next)
    with BuildSketch(Plane.XZ.offset(58.8), mode=Mode.PRIVATE) as cut_extrude10_sk9:
        with Locations(Location((0, 0, 0), (0, 0, 270))):
            Circle(SKETCH16_R_2)
    cut_extrude10_tool9 = extrude(cut_extrude10_sk9.sketch, amount=-CUT_EXTRUDE10_REACH, mode=Mode.PRIVATE) & part_1.part
    add(cut_extrude10_tool1.solids().sort_by_distance((0, -58.8, 33.75))[0], mode=Mode.SUBTRACT)
    add(cut_extrude10_tool2.solids().sort_by_distance((23.864854, -58.8, 23.864854))[0], mode=Mode.SUBTRACT)
    add(cut_extrude10_tool3.solids().sort_by_distance((33.75, -58.8, 0))[0], mode=Mode.SUBTRACT)
    add(cut_extrude10_tool4.solids().sort_by_distance((23.864854, -58.8, -23.864854))[0], mode=Mode.SUBTRACT)
    add(cut_extrude10_tool5.solids().sort_by_distance((0, -58.8, -33.75))[0], mode=Mode.SUBTRACT)
    add(cut_extrude10_tool6.solids().sort_by_distance((-23.864854, -58.8, -23.864854))[0], mode=Mode.SUBTRACT)
    add(cut_extrude10_tool7.solids().sort_by_distance((-33.75, -58.8, 0))[0], mode=Mode.SUBTRACT)
    add(cut_extrude10_tool8.solids().sort_by_distance((-23.864854, -58.8, 23.864854))[0], mode=Mode.SUBTRACT)
    add(cut_extrude10_tool9.solids().sort_by_distance((0, -58.8, 0))[0], mode=Mode.SUBTRACT)

    # Sketch17 → Cut-Extrude11 (cut)
    with BuildSketch(Plane.XZ.offset(58.8)):
        with Locations(Location((0, 0, 0), (0, 0, 270))):
            Circle(SKETCH17_R)
        with Locations(Location((0, 0, 0), (0, 0, 270))):
            Circle(SKETCH17_R_2, mode=Mode.SUBTRACT)
    extrude(amount=-CUT_EXTRUDE11_DEPTH, mode=Mode.SUBTRACT)


solid = part_1.part
